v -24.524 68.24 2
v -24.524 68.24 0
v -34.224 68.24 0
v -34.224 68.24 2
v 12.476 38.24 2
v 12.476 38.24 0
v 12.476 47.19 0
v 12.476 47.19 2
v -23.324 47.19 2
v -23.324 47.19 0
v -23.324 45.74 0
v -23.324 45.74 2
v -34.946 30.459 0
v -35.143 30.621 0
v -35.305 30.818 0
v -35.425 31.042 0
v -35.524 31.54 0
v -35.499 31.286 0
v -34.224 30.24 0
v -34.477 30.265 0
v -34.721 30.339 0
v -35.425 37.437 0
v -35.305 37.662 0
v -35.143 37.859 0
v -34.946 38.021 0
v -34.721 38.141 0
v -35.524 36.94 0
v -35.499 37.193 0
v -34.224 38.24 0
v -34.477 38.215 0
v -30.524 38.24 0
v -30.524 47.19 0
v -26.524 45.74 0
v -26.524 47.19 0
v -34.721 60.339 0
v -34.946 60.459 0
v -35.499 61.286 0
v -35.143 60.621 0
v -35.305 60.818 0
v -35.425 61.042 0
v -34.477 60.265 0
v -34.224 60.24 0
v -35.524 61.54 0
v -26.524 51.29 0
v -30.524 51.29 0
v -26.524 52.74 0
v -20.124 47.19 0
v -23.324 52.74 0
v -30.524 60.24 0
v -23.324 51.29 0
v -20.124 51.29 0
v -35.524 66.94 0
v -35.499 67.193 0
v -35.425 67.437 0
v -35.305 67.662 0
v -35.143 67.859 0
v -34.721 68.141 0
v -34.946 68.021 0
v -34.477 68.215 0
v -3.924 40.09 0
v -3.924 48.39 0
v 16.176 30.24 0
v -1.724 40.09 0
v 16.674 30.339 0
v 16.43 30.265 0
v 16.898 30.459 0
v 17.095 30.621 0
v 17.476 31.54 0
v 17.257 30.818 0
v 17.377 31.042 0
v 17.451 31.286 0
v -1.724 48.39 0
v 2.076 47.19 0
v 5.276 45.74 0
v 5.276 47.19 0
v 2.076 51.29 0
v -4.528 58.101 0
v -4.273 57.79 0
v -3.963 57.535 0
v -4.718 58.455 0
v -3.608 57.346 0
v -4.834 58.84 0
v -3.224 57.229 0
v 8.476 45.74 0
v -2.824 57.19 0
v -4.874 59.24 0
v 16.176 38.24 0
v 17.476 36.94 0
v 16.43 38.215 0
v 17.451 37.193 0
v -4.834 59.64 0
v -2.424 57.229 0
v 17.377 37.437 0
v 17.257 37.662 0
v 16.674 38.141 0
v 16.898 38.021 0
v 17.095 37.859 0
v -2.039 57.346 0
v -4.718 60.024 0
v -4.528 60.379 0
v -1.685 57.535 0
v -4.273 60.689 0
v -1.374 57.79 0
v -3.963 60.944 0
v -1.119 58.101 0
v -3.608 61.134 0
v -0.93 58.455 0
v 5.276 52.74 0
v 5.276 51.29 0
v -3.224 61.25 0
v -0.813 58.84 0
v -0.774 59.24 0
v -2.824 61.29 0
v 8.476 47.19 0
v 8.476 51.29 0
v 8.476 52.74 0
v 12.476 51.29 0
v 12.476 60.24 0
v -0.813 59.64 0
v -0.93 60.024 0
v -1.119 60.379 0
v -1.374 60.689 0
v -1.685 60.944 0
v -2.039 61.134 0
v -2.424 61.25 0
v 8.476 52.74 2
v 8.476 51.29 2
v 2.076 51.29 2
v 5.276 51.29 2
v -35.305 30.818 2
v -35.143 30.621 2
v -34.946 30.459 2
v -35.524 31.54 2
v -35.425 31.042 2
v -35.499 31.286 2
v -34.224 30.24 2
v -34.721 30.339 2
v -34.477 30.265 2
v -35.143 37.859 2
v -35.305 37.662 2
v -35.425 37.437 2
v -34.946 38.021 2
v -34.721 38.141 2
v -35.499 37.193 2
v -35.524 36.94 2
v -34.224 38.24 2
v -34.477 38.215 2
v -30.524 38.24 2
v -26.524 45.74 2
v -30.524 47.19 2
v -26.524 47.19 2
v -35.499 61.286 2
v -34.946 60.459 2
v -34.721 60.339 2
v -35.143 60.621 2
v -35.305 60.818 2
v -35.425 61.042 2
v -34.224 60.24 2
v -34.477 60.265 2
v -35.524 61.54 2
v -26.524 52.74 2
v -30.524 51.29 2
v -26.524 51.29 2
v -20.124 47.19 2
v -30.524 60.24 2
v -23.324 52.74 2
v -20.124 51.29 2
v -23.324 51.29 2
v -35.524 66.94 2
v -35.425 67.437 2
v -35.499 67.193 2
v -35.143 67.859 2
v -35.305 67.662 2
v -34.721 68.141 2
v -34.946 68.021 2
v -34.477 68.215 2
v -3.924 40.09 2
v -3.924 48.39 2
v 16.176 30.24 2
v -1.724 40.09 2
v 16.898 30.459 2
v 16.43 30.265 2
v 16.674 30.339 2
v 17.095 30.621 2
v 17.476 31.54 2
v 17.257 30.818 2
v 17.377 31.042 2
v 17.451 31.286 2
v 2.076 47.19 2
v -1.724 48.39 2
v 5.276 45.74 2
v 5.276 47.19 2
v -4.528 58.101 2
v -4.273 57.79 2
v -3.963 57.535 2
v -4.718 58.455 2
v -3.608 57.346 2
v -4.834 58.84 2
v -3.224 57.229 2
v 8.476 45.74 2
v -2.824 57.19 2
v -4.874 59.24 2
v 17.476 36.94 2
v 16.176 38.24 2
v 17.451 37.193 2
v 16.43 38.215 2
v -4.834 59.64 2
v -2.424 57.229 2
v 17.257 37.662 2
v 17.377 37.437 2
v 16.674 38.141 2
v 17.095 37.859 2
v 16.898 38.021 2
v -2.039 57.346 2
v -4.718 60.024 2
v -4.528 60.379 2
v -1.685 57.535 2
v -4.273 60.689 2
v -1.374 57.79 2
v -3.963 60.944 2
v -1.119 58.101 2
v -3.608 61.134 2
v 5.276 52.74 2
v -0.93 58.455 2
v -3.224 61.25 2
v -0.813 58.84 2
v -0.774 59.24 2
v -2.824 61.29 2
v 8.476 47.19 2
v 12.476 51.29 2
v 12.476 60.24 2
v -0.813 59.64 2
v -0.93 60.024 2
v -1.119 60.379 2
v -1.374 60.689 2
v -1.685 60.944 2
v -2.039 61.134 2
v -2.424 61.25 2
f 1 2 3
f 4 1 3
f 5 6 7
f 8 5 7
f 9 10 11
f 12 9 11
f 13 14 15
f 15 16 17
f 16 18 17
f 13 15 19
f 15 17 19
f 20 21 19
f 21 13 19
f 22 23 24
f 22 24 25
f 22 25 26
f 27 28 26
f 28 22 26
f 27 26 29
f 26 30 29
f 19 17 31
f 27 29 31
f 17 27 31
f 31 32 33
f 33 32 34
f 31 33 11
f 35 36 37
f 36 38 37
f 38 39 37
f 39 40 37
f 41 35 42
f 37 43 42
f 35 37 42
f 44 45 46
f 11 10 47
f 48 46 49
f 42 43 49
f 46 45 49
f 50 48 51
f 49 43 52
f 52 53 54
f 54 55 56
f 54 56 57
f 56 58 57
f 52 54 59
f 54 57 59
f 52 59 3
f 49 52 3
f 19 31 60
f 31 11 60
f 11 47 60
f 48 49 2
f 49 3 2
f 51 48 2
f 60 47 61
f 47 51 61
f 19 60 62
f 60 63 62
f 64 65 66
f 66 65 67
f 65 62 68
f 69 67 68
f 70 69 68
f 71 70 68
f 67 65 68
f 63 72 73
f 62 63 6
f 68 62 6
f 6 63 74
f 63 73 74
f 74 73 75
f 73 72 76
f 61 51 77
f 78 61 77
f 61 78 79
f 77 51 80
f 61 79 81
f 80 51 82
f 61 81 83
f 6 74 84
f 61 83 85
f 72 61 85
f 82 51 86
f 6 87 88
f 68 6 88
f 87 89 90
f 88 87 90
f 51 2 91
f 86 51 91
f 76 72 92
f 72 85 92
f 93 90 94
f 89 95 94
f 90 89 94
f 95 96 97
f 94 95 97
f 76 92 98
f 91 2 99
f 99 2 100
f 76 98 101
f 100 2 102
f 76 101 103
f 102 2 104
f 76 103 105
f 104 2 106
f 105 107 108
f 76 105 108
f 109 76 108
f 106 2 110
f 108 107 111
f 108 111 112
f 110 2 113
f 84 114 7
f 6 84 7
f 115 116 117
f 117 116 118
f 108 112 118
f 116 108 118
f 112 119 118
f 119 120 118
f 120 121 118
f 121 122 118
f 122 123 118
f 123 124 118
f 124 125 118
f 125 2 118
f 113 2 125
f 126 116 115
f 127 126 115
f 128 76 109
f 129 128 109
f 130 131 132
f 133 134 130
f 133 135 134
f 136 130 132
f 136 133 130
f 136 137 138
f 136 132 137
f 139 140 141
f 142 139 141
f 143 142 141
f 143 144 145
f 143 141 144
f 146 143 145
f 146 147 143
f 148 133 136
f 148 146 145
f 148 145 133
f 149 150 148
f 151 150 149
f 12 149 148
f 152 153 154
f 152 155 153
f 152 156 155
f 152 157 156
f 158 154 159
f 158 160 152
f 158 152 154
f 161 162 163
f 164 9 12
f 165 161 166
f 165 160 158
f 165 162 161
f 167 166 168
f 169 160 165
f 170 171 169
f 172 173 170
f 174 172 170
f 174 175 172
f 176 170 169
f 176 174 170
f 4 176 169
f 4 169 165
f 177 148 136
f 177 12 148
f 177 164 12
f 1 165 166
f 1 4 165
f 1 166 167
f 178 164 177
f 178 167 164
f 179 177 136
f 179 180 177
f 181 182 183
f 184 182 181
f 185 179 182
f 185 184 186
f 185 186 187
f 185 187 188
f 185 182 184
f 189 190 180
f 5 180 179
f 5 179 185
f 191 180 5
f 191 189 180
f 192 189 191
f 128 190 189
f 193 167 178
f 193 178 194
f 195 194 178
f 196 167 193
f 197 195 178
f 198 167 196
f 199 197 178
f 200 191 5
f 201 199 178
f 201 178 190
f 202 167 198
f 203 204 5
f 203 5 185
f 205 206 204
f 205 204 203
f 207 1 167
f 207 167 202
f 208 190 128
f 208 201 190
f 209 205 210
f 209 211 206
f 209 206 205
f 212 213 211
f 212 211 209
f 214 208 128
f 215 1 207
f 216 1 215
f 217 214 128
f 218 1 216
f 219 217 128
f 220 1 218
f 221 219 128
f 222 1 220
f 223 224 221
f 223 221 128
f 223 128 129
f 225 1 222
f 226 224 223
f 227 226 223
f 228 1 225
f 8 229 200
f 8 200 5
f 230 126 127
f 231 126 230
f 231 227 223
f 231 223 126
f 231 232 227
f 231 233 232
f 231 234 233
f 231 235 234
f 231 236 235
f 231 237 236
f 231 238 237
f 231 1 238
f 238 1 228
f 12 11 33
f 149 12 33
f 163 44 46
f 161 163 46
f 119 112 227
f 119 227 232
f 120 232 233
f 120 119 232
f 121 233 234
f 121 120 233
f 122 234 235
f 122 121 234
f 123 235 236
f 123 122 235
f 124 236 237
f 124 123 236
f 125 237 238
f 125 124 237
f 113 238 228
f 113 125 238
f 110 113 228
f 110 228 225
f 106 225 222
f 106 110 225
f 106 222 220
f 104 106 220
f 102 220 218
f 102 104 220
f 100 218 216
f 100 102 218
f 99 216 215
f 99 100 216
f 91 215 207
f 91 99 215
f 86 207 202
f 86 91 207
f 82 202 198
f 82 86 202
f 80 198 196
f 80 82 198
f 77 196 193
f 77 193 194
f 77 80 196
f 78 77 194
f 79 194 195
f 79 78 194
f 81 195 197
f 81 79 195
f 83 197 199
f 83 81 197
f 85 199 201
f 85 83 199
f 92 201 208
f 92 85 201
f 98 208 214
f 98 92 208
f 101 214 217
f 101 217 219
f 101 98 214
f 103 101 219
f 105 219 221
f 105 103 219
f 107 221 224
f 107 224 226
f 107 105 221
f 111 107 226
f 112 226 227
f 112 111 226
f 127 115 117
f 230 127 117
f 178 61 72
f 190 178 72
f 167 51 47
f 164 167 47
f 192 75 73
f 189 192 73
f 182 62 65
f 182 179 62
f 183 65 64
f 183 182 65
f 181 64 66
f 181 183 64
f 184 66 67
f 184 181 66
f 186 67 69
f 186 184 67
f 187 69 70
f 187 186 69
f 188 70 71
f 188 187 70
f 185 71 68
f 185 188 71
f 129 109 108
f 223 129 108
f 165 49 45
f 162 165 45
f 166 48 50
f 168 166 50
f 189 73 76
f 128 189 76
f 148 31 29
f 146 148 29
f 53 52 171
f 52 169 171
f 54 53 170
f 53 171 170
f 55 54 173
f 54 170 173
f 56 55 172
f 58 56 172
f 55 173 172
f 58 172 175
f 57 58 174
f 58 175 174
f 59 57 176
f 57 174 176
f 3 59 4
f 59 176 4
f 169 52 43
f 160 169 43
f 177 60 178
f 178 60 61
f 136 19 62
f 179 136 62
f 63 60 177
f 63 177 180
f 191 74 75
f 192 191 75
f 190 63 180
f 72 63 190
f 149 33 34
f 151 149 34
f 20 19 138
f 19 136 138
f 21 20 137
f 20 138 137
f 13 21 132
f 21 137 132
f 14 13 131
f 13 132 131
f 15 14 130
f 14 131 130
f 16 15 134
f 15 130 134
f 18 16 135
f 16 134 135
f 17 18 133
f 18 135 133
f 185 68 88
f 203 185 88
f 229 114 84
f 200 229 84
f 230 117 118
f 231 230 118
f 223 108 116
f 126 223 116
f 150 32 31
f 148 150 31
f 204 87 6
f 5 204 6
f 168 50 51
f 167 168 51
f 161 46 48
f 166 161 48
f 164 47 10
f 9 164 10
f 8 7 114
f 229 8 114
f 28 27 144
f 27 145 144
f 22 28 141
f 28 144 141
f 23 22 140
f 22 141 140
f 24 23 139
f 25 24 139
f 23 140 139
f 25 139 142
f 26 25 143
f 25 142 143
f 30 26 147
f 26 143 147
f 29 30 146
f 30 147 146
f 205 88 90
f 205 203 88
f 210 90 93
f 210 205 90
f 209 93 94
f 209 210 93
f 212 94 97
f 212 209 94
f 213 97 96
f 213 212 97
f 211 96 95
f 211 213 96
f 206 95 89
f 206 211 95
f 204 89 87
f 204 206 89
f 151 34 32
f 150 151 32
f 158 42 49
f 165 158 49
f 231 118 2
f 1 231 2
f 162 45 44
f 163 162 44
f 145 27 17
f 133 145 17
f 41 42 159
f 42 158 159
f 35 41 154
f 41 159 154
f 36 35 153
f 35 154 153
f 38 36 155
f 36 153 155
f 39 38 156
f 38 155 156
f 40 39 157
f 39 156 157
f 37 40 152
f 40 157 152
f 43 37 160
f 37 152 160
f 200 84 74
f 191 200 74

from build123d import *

# Parameters (mm, degrees)
SKETCH_1_R      = 2.05
SKETCH_1_W      = 2.2
SKETCH_1_H      = 8.3
EXTRUDE_1_DEPTH = 2
FILLET_1_R      = 1.3


with BuildPart() as part:
    # 草图1 → 凸台-拉伸1 (new body)
    with BuildSketch(Plane.XY):
        Polygon((-35.523848217, 30.239854129), (-30.523848217, 30.239854129), (12.476151783, 30.239854129), (17.476151783, 30.239854129), (17.476151783, 38.239854129), (12.476151783, 38.239854129), (12.476151783, 47.189854129), (8.476151783, 47.189854129), (8.476151783, 45.739854129), (5.276151783, 45.739854129), (5.276151783, 47.189854129), (2.076151783, 47.189854129), (2.076151783, 51.289854129), (5.276151783, 51.289854129), (5.276151783, 52.739854129), (8.476151783, 52.739854129), (8.476151783, 51.289854129), (12.476151783, 51.289854129), (12.476151783, 60.239854129), (-24.523824953, 68.239854129), (-30.523848217, 68.239854129), (-35.523848217, 68.239854129), (-35.523848217, 60.239854129), (-30.523848217, 60.239854129), (-30.523848217, 51.289854129), (-26.523848217, 51.289854129), (-26.523848217, 52.739854129), (-23.323848217, 52.739854129), (-23.323848217, 51.289854129), (-20.123848217, 51.289854129), (-20.123848217, 47.189854129), (-23.323848217, 47.189854129), (-23.323848217, 45.739854129), (-26.523848217, 45.739854129), (-26.523848217, 47.189854129), (-30.523848217, 47.189854129), (-30.523848217, 38.239854129), (-35.523848217, 38.239854129), align=None)
        with Locations((-2.823848217, 59.239854129)):
            Circle(SKETCH_1_R, mode=Mode.SUBTRACT)
        with Locations((-2.823848217, 44.239854129)):
            Rectangle(SKETCH_1_W, SKETCH_1_H, mode=Mode.SUBTRACT)
    extrude(amount=EXTRUDE_1_DEPTH)

    # 圆角1
    fillet_1_edges = [part.edges().sort_by_distance(p)[0] for p in [
        (-35.523848217, 60.239854129, 1),
        (-35.523848217, 68.239854129, 1),
        (17.476151783, 38.239854129, 1),
        (17.476151783, 30.239854129, 1),
        (-35.523848217, 30.239854129, 1),
        (-35.523848217, 38.239854129, 1),
    ]]
    fillet(fillet_1_edges, radius=FILLET_1_R)


solid = part.part
